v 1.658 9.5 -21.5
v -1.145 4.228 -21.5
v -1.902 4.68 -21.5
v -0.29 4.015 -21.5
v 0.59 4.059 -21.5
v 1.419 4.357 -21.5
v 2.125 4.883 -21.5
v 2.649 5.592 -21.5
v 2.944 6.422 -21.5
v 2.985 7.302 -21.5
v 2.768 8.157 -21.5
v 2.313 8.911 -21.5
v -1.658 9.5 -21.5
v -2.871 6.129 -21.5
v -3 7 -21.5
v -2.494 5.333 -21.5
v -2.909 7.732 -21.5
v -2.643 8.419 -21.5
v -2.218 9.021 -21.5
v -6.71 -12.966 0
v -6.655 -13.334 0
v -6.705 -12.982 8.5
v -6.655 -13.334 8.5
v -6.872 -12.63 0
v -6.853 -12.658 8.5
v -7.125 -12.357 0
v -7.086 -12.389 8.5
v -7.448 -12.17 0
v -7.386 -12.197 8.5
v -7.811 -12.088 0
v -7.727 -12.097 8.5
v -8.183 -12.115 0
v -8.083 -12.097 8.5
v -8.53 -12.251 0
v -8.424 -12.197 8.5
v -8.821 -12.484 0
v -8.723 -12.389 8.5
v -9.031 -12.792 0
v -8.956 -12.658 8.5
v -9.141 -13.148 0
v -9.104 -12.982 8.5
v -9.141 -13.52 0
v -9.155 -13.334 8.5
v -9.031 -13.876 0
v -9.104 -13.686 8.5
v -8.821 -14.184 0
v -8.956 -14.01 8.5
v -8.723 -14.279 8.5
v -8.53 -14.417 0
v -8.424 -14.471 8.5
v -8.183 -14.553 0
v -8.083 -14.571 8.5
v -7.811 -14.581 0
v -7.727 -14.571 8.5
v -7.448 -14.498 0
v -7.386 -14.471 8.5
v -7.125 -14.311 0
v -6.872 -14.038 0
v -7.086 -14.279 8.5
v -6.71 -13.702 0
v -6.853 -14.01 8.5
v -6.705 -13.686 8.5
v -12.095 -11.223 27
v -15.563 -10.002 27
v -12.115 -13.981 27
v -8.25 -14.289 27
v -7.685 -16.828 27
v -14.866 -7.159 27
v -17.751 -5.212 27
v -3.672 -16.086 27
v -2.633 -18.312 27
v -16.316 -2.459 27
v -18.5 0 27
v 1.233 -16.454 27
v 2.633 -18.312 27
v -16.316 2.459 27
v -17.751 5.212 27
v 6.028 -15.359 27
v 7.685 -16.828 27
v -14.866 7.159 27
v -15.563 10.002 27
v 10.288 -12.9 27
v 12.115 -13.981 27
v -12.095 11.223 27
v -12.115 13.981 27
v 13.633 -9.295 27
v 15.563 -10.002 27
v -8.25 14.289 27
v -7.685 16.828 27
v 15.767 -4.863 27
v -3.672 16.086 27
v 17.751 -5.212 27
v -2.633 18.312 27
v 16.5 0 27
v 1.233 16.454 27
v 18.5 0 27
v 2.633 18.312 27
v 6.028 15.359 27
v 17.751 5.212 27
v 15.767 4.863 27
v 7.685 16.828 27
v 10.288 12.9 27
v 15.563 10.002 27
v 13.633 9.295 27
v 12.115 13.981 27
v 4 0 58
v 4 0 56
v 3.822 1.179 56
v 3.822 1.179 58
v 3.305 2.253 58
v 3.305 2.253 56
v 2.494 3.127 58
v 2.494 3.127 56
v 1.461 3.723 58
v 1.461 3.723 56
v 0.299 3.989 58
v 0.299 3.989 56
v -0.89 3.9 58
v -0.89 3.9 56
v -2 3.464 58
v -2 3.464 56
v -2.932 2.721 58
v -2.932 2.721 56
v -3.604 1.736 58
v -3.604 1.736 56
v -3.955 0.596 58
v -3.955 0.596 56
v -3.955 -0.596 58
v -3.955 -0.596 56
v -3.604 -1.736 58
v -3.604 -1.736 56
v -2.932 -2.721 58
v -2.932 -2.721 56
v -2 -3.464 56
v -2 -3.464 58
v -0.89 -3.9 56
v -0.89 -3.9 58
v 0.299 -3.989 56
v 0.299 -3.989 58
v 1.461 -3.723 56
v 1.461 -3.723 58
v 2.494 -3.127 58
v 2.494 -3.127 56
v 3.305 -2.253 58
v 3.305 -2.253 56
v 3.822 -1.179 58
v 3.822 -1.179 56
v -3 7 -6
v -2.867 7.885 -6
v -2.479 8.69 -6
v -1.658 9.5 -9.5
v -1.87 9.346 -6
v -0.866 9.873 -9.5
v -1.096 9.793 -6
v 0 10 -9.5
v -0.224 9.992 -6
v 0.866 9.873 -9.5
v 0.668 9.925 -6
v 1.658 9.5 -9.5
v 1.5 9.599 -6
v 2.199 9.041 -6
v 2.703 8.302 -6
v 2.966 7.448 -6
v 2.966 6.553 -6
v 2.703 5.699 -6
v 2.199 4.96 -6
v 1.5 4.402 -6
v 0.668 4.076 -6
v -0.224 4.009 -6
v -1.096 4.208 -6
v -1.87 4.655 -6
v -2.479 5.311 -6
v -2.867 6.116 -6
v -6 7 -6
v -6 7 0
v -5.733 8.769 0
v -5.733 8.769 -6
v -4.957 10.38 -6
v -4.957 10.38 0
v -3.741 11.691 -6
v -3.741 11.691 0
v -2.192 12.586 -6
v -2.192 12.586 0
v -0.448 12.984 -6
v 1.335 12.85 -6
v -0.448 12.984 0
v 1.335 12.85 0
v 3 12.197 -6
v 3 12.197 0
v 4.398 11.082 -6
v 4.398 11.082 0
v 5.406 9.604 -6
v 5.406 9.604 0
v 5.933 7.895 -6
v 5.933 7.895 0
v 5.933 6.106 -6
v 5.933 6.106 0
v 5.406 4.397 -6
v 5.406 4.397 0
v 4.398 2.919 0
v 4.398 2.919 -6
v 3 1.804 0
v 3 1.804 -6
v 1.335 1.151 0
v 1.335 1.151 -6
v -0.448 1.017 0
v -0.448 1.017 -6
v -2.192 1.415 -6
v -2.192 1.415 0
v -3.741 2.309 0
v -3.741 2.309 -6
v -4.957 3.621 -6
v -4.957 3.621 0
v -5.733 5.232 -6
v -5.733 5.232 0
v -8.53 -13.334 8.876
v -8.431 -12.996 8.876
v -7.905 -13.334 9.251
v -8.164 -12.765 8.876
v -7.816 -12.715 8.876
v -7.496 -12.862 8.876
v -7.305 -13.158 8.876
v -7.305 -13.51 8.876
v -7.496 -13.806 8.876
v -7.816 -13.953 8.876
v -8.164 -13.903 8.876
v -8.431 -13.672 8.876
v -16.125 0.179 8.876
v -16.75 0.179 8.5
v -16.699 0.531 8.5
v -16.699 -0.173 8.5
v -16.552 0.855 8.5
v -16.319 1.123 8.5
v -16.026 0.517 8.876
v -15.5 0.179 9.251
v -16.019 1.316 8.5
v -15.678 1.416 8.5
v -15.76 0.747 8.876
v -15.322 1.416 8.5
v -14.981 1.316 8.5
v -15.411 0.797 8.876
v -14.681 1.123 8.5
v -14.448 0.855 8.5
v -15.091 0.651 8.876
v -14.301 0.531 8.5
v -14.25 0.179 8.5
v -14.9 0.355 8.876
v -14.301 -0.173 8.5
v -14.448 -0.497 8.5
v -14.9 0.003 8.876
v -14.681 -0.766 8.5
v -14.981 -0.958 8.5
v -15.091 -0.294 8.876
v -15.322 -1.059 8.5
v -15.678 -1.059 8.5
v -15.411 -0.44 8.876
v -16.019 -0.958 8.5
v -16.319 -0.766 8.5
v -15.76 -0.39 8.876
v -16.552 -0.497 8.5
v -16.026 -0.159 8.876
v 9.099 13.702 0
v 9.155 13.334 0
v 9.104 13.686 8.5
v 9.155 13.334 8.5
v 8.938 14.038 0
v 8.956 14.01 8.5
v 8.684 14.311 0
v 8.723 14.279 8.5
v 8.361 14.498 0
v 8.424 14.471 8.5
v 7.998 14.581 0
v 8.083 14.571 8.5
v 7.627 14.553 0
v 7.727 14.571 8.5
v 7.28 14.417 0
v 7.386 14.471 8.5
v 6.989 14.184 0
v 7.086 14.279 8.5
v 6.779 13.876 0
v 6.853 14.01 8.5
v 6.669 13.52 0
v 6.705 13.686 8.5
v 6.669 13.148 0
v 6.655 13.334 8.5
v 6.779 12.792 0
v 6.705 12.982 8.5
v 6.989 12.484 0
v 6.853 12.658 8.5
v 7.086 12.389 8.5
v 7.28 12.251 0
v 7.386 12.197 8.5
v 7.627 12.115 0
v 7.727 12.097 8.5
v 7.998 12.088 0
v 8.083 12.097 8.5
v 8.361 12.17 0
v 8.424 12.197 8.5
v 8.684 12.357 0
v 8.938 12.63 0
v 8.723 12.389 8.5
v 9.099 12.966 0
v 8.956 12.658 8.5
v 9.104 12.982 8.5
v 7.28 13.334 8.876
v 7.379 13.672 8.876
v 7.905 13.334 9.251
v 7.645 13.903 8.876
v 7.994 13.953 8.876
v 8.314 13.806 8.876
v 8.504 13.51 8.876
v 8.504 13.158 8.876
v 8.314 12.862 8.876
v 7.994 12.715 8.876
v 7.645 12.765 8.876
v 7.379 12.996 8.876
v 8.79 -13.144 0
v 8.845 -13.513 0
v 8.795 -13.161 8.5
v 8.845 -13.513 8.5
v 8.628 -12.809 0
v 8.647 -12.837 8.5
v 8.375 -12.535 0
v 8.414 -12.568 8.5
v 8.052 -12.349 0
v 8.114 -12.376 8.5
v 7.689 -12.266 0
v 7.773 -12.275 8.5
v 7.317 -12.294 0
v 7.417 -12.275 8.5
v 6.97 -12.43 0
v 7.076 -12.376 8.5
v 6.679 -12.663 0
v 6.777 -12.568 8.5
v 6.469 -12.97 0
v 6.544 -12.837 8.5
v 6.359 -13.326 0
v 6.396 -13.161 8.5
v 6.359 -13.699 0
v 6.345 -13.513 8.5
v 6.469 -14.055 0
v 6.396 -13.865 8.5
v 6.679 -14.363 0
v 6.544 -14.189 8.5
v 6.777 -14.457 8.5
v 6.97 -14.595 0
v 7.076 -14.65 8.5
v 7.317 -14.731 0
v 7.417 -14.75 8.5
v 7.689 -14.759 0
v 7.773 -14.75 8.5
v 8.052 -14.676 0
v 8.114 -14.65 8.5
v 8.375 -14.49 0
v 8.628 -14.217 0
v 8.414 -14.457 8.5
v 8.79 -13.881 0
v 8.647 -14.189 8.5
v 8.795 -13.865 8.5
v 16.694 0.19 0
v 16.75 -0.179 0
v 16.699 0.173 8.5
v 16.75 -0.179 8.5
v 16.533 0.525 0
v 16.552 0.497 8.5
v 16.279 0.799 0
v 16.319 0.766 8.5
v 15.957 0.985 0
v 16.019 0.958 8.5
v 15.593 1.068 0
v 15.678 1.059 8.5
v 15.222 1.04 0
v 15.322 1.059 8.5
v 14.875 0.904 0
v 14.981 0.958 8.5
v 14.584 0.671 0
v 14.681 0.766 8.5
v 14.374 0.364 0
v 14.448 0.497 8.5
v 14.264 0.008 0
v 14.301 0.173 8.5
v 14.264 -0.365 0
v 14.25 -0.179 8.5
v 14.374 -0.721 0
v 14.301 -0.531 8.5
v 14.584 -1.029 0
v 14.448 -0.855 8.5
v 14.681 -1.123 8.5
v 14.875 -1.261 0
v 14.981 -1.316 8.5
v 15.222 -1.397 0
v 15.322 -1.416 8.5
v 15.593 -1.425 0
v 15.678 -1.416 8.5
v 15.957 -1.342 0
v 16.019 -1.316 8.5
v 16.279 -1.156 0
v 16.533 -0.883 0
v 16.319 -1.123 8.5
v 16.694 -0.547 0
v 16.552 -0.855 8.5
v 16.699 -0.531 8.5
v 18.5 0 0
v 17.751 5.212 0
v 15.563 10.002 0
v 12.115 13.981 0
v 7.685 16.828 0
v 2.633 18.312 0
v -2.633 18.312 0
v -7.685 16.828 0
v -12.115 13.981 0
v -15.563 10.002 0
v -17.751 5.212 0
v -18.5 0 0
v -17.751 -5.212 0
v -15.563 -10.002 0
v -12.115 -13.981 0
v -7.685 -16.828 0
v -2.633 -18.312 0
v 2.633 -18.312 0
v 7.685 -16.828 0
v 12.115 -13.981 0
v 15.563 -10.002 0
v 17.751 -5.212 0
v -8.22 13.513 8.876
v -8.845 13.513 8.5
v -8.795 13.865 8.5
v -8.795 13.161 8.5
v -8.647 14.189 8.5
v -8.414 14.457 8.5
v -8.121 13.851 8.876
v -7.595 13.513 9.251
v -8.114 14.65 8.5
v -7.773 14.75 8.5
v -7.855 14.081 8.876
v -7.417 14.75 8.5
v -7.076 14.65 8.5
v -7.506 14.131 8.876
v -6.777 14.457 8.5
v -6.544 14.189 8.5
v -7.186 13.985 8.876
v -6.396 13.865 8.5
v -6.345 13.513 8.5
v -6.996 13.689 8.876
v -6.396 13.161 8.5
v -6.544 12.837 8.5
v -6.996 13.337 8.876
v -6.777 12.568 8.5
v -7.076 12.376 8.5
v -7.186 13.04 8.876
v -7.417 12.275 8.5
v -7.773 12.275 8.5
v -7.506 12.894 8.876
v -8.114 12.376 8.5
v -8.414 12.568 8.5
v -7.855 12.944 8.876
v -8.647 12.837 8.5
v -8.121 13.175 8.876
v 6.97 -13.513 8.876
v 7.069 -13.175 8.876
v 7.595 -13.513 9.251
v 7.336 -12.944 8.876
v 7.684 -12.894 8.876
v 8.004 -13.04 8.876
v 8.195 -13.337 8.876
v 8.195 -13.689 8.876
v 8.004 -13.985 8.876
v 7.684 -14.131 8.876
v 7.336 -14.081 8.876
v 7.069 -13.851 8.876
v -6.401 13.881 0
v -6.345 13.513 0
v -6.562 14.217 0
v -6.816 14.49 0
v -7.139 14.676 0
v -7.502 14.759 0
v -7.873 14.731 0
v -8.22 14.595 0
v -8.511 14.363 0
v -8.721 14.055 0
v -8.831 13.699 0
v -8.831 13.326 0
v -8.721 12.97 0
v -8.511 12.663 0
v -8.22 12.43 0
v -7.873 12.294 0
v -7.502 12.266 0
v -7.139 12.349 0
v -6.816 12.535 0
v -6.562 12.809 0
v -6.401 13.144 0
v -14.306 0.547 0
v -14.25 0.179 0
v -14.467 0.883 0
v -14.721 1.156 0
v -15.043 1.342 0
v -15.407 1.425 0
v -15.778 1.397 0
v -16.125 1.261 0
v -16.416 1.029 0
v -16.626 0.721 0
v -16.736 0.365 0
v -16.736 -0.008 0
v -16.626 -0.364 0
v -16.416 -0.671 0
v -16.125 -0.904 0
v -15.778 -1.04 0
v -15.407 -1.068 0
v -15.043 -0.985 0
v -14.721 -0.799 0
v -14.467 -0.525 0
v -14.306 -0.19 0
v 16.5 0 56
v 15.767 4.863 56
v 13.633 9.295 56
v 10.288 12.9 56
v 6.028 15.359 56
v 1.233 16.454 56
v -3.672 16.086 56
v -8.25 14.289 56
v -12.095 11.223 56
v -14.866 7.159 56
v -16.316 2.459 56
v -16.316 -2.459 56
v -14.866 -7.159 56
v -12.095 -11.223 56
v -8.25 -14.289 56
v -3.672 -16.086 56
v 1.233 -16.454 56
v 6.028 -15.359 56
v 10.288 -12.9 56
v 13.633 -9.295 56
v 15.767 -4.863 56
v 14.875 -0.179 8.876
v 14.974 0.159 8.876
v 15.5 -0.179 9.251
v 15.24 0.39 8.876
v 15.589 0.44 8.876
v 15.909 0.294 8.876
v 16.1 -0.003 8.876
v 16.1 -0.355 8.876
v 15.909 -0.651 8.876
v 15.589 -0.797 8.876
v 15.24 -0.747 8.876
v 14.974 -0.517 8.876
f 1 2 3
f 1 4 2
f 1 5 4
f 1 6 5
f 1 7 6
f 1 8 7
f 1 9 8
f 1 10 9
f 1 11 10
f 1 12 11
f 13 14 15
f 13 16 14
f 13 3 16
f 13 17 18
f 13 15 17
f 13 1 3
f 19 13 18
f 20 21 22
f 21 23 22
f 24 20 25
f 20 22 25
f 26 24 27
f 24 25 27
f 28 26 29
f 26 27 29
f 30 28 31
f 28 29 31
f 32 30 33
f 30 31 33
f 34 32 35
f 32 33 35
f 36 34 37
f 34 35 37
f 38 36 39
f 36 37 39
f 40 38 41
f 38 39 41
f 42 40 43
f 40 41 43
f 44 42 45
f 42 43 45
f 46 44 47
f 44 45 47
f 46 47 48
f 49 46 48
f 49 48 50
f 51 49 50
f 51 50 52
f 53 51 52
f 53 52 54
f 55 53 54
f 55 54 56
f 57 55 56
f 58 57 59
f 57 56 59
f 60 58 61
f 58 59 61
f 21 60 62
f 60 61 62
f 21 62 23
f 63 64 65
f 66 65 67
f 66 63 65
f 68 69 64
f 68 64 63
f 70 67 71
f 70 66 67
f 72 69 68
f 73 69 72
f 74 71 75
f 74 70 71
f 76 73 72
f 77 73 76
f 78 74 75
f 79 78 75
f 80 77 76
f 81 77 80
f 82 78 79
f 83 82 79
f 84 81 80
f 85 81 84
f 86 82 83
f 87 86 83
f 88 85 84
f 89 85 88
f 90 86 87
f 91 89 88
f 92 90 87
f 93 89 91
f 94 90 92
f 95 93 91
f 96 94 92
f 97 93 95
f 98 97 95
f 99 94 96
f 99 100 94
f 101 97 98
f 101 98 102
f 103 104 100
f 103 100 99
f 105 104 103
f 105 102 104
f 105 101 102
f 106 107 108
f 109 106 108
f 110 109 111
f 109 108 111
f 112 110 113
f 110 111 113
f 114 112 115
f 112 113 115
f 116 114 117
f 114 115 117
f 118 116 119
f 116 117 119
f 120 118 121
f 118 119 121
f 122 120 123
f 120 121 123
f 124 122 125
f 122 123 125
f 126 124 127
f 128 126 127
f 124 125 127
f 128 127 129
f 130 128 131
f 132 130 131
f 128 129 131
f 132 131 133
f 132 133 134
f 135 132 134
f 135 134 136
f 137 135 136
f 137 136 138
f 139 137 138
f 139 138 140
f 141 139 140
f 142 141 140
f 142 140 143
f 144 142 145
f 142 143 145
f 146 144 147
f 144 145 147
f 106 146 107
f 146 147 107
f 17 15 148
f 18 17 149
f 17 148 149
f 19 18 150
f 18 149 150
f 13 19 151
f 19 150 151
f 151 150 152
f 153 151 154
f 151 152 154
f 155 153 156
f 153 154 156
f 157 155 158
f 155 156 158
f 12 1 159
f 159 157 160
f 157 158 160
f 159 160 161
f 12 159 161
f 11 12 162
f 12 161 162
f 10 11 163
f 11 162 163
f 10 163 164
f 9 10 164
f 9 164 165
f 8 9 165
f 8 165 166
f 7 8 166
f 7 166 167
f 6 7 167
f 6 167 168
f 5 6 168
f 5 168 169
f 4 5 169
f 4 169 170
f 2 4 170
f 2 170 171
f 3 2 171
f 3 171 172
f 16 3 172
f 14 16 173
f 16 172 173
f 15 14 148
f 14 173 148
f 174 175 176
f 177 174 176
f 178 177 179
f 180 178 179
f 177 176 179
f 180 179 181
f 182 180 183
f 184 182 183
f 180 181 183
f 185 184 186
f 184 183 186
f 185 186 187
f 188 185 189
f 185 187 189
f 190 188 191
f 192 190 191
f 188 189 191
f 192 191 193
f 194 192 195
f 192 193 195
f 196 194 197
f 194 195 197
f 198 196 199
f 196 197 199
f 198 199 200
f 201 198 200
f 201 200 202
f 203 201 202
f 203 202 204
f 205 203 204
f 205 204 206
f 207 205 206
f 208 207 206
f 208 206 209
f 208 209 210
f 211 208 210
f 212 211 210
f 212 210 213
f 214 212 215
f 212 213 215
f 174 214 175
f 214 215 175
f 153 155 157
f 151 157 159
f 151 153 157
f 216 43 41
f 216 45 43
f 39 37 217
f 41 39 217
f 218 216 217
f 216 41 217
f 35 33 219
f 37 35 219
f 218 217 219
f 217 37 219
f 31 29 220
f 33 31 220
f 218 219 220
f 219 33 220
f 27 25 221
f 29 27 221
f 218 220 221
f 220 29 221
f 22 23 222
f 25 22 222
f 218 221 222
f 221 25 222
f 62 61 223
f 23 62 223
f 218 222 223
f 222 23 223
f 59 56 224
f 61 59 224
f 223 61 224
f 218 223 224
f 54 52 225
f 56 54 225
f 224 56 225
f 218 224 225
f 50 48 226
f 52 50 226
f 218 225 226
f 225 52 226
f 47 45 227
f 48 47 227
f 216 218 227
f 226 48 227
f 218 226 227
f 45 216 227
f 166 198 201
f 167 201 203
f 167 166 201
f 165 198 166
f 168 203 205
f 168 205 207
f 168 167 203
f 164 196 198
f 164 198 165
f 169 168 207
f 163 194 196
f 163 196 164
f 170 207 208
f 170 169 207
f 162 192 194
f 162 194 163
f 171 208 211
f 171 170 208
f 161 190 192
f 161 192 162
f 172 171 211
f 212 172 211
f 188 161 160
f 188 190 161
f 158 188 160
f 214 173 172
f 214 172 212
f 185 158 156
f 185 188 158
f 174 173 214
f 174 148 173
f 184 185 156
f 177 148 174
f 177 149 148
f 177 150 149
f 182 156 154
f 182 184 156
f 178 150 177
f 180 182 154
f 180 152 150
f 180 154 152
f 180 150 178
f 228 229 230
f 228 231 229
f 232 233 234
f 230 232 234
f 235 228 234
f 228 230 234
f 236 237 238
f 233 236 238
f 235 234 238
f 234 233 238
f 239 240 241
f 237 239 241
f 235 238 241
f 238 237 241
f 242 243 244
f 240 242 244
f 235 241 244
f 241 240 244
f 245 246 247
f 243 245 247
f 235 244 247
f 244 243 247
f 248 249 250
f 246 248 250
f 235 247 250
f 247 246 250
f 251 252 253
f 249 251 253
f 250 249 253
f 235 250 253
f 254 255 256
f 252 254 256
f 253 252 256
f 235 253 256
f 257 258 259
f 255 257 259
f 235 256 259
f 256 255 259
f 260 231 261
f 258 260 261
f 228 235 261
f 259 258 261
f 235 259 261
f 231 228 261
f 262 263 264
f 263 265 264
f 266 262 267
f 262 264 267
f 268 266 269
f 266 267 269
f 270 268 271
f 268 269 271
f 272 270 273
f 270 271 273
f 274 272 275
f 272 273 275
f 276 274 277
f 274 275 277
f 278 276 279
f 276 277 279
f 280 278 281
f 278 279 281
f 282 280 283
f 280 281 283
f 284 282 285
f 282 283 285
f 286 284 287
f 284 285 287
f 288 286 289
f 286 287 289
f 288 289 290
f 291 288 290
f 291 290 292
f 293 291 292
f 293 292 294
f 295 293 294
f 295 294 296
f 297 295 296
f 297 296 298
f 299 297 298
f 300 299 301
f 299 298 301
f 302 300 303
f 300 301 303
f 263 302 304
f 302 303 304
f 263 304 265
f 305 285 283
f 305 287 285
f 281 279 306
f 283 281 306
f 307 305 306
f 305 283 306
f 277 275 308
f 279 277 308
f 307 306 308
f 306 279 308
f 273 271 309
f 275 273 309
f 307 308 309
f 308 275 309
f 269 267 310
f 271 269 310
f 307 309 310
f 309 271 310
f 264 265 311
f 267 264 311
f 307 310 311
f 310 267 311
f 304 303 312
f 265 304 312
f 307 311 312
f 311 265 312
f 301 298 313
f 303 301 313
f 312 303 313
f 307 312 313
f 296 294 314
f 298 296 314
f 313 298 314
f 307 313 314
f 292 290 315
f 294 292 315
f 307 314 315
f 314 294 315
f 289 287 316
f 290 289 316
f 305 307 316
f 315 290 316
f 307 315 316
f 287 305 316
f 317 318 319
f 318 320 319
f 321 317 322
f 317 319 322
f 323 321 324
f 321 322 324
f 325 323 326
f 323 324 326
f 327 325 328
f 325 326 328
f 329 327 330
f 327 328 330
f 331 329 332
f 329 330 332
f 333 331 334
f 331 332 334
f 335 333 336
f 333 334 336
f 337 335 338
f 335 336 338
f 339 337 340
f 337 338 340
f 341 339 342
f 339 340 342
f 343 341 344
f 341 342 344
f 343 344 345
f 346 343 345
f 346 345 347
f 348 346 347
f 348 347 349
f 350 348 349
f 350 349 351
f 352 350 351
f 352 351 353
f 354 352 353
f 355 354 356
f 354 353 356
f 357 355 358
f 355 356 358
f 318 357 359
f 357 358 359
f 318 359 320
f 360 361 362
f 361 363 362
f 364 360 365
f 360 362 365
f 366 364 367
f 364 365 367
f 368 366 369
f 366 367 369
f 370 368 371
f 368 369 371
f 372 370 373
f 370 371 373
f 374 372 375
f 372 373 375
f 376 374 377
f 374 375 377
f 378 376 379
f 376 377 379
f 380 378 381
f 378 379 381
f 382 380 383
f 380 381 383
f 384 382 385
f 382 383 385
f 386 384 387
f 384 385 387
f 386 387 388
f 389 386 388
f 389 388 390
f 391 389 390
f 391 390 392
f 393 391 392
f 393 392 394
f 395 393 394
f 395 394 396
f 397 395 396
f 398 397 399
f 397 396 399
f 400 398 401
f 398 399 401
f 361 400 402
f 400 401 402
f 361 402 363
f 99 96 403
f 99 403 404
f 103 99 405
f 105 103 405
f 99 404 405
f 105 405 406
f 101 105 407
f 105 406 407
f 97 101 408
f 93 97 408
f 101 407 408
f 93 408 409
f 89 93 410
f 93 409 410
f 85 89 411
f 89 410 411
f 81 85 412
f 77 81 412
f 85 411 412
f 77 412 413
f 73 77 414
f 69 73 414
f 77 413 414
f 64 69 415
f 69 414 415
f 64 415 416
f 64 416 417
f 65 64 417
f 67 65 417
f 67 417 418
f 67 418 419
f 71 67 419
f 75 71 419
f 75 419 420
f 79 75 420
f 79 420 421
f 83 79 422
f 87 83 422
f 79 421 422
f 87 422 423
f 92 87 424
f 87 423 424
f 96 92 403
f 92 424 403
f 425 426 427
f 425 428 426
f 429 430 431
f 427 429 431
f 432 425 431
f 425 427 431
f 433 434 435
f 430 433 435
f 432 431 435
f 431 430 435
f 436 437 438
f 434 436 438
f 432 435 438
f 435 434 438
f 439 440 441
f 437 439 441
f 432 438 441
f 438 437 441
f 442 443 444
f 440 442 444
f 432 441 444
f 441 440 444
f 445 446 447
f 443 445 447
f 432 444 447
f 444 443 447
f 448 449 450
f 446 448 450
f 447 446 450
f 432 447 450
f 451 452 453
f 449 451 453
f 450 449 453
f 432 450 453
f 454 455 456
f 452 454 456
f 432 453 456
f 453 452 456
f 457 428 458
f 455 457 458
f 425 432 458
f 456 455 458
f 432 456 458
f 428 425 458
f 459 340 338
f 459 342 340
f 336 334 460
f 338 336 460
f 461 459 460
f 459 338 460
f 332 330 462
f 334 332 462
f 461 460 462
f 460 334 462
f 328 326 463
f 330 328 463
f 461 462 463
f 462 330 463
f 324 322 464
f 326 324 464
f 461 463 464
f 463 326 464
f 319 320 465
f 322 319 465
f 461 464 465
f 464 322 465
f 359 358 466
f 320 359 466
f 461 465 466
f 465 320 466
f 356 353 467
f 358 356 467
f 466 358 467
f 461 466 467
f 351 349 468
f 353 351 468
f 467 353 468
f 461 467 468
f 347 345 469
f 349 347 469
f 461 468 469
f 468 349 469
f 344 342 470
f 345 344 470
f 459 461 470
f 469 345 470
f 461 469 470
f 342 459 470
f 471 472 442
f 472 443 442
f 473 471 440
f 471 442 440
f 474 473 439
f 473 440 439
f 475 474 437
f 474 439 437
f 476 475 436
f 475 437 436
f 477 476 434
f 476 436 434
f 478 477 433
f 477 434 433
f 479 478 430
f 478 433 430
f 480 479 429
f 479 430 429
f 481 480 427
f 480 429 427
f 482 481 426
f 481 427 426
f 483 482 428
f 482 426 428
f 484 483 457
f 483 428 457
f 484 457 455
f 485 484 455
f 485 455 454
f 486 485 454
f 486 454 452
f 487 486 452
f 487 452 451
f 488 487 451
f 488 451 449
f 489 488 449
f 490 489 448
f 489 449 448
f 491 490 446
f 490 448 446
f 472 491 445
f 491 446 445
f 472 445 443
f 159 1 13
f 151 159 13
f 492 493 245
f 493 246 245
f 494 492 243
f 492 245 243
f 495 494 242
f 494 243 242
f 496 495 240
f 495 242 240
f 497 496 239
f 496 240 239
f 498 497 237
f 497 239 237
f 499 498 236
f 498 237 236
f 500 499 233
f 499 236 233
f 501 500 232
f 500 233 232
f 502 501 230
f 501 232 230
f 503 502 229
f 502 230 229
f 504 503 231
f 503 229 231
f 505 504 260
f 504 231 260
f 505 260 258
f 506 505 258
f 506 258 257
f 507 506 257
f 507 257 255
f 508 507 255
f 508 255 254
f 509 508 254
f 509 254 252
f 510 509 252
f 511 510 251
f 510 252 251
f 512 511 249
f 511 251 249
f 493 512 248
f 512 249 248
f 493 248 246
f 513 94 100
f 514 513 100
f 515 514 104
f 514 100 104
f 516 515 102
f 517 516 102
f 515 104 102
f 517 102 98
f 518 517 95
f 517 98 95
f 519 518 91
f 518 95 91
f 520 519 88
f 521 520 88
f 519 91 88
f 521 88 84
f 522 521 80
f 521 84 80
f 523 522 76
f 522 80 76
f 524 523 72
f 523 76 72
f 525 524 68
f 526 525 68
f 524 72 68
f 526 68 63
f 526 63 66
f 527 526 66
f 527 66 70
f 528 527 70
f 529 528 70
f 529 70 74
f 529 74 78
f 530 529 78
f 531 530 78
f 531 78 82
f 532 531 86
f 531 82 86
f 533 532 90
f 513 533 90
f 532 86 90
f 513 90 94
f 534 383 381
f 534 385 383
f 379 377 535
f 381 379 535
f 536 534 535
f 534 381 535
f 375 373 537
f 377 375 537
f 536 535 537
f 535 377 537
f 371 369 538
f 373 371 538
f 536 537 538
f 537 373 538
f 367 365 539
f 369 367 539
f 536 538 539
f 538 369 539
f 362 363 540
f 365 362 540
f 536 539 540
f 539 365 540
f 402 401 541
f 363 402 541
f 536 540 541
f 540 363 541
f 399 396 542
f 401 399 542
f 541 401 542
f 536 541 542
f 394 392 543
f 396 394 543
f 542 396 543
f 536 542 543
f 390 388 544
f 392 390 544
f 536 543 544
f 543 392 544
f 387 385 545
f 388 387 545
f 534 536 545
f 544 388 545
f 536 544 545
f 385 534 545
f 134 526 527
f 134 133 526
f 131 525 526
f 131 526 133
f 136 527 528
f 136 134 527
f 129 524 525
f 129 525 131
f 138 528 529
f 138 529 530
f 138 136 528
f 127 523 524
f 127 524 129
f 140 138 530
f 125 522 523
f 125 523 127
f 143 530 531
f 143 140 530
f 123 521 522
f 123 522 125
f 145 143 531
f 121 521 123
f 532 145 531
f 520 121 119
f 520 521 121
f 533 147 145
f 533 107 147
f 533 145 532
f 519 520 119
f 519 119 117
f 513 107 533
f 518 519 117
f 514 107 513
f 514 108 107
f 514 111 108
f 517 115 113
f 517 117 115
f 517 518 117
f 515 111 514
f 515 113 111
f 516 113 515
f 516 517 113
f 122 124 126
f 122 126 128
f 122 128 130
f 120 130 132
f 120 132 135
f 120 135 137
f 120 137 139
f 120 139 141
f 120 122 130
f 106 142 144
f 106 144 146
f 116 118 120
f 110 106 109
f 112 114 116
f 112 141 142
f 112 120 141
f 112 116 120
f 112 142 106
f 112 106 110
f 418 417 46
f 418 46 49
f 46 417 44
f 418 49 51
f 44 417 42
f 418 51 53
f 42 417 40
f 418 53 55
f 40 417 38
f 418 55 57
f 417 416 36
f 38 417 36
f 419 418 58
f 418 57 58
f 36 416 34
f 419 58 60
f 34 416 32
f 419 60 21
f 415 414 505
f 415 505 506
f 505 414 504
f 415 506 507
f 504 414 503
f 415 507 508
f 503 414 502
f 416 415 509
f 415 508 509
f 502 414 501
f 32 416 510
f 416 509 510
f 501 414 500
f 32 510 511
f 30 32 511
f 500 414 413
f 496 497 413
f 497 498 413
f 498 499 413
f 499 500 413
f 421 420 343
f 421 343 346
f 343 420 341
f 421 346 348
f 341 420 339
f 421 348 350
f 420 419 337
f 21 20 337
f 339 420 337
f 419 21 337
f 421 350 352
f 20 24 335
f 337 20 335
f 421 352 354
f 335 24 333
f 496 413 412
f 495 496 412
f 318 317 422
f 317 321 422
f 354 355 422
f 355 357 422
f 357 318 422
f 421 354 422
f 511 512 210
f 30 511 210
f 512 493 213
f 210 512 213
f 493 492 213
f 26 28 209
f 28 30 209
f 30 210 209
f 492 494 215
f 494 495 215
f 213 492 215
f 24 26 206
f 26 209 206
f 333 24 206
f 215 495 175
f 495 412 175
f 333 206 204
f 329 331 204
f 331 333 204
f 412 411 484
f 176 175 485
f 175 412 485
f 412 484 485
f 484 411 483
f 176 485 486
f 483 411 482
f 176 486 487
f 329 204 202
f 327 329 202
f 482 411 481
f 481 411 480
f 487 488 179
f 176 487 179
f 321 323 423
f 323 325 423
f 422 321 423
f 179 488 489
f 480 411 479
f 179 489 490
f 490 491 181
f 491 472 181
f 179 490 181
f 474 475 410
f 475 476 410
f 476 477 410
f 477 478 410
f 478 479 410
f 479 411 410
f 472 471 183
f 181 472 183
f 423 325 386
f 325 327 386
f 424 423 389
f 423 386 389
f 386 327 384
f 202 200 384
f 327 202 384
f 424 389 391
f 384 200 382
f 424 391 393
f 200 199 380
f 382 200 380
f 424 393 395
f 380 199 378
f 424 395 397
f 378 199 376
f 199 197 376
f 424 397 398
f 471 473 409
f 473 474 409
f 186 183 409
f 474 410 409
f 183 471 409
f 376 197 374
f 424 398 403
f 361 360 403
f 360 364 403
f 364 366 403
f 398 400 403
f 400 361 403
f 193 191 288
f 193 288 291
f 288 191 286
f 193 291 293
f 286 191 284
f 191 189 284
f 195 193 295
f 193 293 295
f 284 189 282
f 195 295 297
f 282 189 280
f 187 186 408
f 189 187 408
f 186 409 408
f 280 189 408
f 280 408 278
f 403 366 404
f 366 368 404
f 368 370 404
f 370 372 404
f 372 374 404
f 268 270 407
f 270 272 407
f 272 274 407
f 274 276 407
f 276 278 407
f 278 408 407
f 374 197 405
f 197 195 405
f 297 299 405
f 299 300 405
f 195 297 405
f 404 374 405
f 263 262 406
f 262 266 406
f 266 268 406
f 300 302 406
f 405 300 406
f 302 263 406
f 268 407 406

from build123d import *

# Parameters (mm, degrees)
SKETCH1_R               = 18.5
BOSS_EXTRUDE1_DEPTH     = 27
SKETCH2_R               = 16.5
BOSS_EXTRUDE2_DEPTH     = 29
SKETCH3_R               = 4
BOSS_EXTRUDE3_DEPTH     = 2
M3_TAPPED_HOLE1_D       = 2.5
M3_TAPPED_HOLE1_DEPTH   = 8.5
M3_TAPPED_HOLE1_TIP     = 0.751075774
SKETCH4_R               = 6
BOSS_EXTRUDE4_DEPTH     = 6
SKETCH7_R               = 3
BOSS_EXTRUDE5_DEPTH     = 15.5
CUT_EXTRUDE1_DEPTH      = 1
CUT_EXTRUDE1_DEPTH_BACK = 12


with BuildPart() as part:
    # Sketch1 → Boss-Extrude1 (new body)
    with BuildSketch(Plane.XY):
        Circle(SKETCH1_R)
    extrude(amount=BOSS_EXTRUDE1_DEPTH)

    # Sketch2 → Boss-Extrude2 (add)
    with BuildSketch(Plane.XY.offset(27)):
        Circle(SKETCH2_R)
    extrude(amount=BOSS_EXTRUDE2_DEPTH)

    # Sketch3 → Boss-Extrude3 (add)
    with BuildSketch(Plane.XY.offset(56)):
        Circle(SKETCH3_R)
    extrude(amount=BOSS_EXTRUDE3_DEPTH)

    # M3 Tapped Hole1
    with Locations(Plane(origin=(15.5, -0.178765265, 0), x_dir=(-1, 0, 0), z_dir=(0, 0, -1))):
        with Locations((0, 0), (7.59518474, 13.512776391), (23.09518474, 13.691541656), (31, 0.35753053), (23.40481526, -13.155245861), (7.90481526, -13.334011126)):
            Hole(M3_TAPPED_HOLE1_D / 2, depth=M3_TAPPED_HOLE1_DEPTH)
            with Locations((0, 0, -(M3_TAPPED_HOLE1_DEPTH + M3_TAPPED_HOLE1_TIP / 2))):  # 118° drill point
                Cone(0, M3_TAPPED_HOLE1_D / 2, M3_TAPPED_HOLE1_TIP, mode=Mode.SUBTRACT)

    # Sketch4 → Boss-Extrude4 (add)
    with BuildSketch(Plane(origin=(0, 0, 0), x_dir=(-1, 0, 0), z_dir=(0, 0, -1))):
        with Locations((0, 7.000465539)):
            Circle(SKETCH4_R)
    extrude(amount=BOSS_EXTRUDE4_DEPTH)

    # Sketch7 → Boss-Extrude5 (add)
    with BuildSketch(Plane(origin=(0, 0, -6), x_dir=(-1, 0, 0), z_dir=(0, 0, -1))):
        with Locations((0, 7.000465539)):
            Circle(SKETCH7_R)
    extrude(amount=BOSS_EXTRUDE5_DEPTH)

    # Sketch8 → Cut-Extrude1 (cut, two sides)
    with BuildSketch(Plane(origin=(0, 0, -21.5), x_dir=(-1, 0, 0), z_dir=(0, 0, -1))) as cut_extrude1_sk:
        Polygon((-80.662185592, 9.500465539), (-1.658312395, 9.500465539), (1.658312395, 9.500465539), (80.662185592, 9.500465539), (80.662185592, 167.508211933), (-80.662185592, 167.508211933), align=None)
    extrude(amount=CUT_EXTRUDE1_DEPTH, mode=Mode.SUBTRACT)
    extrude(cut_extrude1_sk.sketch, amount=-CUT_EXTRUDE1_DEPTH_BACK, mode=Mode.SUBTRACT)


solid = part.part
